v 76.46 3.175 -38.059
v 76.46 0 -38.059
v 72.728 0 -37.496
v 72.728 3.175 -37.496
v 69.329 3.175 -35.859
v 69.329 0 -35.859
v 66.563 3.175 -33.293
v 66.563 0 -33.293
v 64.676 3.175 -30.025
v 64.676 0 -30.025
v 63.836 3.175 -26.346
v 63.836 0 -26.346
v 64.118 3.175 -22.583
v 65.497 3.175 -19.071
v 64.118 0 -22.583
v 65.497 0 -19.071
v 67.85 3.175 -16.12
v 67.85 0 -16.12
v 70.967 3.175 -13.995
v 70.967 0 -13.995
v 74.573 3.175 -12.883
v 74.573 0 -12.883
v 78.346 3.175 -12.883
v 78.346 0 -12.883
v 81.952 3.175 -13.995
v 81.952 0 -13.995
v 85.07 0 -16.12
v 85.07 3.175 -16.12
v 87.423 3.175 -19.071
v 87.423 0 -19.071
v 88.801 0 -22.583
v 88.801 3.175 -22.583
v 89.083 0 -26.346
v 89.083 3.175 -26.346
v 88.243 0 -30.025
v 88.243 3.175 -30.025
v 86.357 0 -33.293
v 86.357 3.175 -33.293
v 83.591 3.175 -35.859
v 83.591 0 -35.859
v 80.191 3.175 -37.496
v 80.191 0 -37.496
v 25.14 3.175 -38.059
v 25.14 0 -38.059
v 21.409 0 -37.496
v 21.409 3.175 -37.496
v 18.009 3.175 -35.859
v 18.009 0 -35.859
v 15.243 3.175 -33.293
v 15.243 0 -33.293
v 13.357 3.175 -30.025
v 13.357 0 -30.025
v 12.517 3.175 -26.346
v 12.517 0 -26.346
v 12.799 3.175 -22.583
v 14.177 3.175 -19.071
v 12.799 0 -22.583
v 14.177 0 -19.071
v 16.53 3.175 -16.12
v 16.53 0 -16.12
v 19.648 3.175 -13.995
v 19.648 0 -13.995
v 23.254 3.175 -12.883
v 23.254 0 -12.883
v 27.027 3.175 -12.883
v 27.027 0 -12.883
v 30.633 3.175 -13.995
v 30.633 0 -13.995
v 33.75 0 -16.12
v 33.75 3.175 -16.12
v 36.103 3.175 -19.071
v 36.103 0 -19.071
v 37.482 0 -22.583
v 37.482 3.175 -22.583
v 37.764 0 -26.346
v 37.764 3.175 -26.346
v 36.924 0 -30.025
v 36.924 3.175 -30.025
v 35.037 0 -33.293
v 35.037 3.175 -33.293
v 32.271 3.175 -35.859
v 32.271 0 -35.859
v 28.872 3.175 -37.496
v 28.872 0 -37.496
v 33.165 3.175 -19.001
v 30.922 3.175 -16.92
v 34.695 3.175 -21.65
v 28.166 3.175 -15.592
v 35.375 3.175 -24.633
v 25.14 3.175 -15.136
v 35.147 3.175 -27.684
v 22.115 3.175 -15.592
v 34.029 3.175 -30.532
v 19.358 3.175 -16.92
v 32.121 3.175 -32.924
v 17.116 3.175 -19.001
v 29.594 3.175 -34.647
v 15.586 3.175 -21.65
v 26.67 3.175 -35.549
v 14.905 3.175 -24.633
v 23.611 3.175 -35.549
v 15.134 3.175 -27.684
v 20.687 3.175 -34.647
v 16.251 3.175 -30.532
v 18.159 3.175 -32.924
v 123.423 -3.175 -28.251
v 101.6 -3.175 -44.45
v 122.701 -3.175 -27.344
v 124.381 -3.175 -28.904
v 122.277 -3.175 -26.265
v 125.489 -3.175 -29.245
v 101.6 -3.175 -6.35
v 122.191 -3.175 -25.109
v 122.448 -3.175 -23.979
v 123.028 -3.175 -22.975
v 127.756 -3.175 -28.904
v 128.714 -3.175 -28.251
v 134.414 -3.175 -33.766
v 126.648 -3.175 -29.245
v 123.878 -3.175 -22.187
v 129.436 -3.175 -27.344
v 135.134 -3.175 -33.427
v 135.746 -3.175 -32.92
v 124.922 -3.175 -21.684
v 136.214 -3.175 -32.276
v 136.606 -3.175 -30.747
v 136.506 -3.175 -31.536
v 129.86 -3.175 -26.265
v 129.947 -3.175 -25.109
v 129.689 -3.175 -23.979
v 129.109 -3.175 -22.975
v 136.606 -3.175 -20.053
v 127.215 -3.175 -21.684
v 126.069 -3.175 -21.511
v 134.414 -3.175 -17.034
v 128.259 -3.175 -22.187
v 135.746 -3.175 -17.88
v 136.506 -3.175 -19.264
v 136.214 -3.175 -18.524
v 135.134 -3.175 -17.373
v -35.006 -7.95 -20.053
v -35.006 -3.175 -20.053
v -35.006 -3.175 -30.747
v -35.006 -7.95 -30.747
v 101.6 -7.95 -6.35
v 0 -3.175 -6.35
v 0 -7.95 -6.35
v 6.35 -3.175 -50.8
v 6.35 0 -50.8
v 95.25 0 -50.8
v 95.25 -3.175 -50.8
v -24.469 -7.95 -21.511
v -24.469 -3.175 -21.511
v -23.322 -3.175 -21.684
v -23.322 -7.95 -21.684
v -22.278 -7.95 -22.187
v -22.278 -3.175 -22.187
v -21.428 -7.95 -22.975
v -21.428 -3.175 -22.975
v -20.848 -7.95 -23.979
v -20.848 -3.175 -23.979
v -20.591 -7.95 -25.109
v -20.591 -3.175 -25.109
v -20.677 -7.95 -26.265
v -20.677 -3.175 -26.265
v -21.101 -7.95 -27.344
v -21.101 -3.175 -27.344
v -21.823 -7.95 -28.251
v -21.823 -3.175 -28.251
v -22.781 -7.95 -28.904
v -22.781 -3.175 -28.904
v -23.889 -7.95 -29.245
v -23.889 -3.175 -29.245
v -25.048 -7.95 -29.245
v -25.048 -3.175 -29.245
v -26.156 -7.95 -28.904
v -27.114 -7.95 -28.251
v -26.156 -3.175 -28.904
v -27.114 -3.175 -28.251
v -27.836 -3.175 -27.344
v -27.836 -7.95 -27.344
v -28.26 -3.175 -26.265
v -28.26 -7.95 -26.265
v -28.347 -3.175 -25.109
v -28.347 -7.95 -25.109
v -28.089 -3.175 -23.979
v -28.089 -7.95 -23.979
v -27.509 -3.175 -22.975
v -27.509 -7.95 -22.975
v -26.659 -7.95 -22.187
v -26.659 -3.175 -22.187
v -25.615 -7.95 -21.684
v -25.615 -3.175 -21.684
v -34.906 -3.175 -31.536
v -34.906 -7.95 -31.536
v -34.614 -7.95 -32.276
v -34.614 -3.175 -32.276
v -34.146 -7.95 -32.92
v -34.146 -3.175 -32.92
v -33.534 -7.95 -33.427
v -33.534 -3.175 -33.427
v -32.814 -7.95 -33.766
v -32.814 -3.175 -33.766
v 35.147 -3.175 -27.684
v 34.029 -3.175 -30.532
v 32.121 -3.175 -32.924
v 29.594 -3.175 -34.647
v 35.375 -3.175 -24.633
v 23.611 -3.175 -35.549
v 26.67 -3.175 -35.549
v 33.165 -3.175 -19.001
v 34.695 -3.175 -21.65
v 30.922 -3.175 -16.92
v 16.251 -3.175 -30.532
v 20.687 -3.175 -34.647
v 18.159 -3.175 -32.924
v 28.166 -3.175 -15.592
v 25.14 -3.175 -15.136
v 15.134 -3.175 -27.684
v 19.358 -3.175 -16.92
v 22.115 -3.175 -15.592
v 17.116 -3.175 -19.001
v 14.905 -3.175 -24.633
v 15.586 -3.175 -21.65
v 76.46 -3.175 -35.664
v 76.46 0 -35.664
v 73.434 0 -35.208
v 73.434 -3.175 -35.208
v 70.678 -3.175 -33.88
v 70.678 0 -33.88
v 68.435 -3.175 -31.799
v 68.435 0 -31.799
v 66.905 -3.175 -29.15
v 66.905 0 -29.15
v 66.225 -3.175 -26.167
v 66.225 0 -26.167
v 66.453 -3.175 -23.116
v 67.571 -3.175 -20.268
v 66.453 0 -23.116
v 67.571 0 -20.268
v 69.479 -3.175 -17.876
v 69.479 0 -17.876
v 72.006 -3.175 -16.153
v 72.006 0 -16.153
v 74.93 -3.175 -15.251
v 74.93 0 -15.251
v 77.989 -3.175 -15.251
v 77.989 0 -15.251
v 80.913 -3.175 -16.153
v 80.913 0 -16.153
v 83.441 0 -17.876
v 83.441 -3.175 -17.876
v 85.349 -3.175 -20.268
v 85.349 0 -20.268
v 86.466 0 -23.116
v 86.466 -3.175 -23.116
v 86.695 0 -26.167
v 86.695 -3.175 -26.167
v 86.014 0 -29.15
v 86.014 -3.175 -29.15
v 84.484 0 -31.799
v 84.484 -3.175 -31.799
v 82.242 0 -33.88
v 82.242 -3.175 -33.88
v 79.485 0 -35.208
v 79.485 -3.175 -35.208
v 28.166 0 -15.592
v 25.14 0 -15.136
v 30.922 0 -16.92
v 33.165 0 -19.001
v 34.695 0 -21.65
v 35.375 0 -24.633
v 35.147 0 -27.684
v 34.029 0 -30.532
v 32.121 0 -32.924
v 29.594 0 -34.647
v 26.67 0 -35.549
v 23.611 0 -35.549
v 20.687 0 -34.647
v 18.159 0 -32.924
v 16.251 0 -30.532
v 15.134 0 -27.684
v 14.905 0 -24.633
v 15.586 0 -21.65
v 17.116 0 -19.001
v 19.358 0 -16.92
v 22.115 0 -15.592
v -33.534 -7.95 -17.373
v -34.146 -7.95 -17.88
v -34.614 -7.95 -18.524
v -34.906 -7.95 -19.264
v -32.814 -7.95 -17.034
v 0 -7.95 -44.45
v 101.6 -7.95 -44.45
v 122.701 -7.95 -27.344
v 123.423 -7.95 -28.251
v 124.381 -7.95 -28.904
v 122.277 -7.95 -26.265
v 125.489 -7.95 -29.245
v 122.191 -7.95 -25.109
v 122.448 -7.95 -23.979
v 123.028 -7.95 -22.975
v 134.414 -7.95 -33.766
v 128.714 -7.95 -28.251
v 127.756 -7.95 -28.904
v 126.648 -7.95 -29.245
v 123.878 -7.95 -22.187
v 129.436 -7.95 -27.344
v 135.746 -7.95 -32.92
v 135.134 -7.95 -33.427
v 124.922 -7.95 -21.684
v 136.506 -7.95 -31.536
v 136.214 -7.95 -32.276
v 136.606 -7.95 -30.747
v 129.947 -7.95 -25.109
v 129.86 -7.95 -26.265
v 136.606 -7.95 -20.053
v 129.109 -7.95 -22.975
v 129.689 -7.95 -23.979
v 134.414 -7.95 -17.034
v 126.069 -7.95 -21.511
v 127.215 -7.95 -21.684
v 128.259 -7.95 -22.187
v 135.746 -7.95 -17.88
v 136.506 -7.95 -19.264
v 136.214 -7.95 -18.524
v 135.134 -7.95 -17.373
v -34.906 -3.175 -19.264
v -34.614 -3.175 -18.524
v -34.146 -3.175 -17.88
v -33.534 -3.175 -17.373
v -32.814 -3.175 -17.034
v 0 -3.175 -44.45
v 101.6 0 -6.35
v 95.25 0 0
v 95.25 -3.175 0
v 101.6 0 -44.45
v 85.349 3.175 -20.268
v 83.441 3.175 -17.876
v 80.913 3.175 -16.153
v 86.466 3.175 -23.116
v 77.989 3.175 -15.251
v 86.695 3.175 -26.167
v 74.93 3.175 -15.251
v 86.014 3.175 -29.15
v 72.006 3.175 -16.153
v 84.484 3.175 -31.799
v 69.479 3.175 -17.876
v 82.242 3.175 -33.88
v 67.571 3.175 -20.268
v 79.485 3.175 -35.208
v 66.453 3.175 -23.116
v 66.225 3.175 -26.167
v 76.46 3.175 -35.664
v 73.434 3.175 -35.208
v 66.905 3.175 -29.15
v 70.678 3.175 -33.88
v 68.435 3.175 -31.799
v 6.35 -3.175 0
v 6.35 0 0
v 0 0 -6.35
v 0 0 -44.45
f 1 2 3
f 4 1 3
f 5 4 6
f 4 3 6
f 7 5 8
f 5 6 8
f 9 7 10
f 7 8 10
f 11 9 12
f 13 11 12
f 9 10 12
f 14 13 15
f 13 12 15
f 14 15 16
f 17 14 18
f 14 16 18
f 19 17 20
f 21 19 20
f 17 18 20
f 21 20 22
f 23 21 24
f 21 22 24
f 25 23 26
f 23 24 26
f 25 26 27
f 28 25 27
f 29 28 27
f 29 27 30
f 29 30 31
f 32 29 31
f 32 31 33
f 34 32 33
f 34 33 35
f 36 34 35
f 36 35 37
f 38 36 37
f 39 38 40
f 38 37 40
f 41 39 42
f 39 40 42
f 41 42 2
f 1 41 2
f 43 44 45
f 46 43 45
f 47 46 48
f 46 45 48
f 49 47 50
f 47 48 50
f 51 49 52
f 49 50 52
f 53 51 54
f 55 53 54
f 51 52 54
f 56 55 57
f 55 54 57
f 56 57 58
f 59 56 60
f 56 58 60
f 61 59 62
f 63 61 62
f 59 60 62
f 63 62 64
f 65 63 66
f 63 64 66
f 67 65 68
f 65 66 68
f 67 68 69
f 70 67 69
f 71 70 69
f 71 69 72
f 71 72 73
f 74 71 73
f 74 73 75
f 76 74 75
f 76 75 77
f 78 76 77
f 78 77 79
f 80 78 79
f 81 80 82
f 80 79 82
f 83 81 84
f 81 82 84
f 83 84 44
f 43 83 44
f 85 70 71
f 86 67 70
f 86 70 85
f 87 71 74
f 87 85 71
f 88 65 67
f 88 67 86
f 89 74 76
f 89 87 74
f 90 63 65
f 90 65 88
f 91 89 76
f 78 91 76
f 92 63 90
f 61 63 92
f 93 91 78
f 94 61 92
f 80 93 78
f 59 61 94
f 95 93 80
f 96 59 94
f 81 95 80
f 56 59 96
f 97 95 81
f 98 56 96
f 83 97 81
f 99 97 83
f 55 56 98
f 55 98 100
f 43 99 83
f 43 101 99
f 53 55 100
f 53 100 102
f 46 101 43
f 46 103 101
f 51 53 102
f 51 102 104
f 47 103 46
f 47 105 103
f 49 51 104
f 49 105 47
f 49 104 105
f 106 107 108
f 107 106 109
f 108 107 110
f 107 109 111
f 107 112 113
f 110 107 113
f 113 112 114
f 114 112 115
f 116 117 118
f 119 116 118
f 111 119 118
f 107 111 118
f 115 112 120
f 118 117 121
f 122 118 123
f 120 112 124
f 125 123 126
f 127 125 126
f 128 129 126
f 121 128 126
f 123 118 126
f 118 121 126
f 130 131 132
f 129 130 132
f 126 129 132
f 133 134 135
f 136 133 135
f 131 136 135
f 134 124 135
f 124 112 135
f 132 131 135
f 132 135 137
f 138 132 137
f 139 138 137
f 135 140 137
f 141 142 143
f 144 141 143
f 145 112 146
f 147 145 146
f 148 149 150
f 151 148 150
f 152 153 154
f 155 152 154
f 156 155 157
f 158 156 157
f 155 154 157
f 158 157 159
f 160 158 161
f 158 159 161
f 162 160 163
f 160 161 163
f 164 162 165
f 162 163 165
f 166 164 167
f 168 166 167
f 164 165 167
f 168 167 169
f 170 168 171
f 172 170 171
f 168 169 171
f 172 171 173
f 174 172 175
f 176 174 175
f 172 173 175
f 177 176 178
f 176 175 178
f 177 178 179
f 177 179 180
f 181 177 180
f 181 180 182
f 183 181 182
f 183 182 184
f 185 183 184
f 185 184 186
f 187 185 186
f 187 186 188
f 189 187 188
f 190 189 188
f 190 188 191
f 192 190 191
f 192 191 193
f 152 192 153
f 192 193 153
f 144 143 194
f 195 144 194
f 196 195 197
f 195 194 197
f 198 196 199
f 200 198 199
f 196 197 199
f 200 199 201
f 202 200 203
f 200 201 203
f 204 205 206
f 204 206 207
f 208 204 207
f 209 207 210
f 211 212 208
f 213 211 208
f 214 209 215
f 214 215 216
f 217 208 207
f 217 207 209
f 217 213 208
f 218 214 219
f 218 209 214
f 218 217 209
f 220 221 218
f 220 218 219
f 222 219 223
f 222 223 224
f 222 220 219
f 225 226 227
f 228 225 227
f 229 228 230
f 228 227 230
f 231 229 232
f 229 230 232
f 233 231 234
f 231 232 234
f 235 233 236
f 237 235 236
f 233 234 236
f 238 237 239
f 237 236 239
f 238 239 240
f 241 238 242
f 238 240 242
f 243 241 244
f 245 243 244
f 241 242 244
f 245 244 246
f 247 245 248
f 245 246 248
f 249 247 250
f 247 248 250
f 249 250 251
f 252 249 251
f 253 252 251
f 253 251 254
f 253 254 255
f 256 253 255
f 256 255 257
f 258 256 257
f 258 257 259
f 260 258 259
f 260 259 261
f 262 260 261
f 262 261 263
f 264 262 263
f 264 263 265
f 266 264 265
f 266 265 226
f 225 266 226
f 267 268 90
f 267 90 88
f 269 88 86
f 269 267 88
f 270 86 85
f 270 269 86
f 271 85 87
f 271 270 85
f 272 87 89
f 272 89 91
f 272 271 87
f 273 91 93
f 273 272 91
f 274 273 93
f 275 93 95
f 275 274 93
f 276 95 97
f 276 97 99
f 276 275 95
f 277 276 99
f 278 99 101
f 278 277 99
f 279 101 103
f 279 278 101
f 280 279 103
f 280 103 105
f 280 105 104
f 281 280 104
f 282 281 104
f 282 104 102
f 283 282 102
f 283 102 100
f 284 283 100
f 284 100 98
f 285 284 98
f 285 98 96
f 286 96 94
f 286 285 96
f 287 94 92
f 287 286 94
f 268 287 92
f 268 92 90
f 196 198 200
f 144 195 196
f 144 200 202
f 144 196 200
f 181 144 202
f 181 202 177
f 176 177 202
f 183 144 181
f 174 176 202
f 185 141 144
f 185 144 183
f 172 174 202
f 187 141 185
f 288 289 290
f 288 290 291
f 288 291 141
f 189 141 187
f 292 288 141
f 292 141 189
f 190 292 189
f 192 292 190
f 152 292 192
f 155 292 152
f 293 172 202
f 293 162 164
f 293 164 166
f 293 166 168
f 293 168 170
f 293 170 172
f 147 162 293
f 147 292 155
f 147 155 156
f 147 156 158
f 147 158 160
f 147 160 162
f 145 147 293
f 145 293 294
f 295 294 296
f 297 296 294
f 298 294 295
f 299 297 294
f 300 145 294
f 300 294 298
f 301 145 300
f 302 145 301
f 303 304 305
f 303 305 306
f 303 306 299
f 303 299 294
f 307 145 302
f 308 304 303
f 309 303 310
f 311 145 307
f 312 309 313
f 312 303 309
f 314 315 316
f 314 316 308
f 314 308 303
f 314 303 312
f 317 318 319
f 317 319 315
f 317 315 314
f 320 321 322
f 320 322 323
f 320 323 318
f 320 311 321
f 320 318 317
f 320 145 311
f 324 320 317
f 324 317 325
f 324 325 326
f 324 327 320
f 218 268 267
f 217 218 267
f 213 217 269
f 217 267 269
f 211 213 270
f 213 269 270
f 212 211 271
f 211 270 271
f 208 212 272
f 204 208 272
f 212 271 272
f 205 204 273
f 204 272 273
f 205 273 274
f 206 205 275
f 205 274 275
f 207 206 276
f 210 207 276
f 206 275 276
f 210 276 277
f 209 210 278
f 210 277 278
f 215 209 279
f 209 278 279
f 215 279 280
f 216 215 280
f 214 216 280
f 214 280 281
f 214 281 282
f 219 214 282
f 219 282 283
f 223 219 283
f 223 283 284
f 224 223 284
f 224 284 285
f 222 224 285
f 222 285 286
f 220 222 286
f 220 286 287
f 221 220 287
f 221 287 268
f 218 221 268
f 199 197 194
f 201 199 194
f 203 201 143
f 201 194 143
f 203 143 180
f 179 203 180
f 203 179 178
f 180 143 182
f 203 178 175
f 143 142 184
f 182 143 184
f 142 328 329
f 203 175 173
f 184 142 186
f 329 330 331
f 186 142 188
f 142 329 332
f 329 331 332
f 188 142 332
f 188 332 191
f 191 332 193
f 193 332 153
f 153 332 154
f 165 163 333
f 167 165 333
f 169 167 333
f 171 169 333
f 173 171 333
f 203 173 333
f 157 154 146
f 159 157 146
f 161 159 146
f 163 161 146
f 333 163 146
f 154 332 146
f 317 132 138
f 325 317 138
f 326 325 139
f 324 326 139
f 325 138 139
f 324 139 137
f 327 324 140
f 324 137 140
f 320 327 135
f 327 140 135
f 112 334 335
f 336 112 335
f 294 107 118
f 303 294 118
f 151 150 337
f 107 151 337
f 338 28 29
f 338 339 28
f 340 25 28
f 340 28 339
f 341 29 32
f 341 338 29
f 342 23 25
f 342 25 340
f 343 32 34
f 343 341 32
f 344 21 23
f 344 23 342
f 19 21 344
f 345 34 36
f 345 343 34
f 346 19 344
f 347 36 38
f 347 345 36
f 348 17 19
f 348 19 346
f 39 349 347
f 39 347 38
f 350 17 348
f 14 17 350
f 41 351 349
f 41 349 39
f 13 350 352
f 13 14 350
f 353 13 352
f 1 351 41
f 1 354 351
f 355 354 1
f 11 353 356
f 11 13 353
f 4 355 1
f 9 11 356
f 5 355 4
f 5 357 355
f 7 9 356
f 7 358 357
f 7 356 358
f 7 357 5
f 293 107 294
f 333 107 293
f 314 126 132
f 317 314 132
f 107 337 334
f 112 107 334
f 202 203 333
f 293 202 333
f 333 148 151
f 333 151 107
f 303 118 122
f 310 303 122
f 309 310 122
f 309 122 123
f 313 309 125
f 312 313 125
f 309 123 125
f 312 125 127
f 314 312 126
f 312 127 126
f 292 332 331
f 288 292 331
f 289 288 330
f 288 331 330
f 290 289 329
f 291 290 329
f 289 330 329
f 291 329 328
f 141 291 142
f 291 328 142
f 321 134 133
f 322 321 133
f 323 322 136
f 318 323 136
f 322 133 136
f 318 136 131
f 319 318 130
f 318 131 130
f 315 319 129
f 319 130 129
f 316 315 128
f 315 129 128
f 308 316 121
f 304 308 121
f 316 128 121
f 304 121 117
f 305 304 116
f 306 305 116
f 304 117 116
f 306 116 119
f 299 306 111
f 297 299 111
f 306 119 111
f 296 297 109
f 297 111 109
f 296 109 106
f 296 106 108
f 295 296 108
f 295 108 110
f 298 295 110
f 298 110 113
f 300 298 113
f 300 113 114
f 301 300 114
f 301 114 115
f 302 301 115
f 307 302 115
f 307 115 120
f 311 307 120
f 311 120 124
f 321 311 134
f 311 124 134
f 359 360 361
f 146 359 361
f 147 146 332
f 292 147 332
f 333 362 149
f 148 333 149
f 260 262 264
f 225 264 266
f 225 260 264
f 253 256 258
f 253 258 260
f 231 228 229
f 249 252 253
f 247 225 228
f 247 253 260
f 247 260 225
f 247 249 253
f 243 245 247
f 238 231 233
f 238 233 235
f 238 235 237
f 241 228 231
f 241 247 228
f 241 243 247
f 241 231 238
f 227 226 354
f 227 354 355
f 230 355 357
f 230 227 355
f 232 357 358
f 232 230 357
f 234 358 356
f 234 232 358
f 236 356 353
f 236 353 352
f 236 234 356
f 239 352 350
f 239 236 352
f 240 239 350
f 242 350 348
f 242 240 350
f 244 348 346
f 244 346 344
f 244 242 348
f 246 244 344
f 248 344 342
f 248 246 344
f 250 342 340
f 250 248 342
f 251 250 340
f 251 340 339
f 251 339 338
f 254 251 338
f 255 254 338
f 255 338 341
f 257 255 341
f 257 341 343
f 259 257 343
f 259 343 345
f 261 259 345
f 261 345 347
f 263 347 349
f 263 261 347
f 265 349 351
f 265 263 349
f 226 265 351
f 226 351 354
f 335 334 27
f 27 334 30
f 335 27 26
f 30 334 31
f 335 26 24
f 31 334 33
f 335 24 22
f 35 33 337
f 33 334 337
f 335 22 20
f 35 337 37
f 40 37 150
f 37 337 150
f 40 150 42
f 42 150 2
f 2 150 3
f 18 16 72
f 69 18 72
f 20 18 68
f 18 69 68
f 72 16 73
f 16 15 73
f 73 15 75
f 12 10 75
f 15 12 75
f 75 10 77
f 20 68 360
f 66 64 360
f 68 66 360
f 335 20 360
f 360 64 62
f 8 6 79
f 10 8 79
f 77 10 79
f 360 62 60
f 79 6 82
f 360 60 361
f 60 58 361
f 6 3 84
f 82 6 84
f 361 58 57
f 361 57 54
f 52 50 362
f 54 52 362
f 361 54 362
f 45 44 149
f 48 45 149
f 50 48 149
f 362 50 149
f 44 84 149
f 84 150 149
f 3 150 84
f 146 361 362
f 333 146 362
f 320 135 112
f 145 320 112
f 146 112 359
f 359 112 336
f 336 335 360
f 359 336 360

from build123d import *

# Parameters (mm, degrees)
EXTRUDE1_DEPTH = 3.175
SKETCH5_R      = 12.6587948
SKETCH5_R_2    = 10.263887676
EXTRUDE2_DEPTH = 3.175
SKETCH7_R      = 10.263887676
EXTRUDE3_DEPTH = 114.636616568
SKETCH8_R      = 3.888872997
SKETCH8_W      = 50.8
SKETCH8_H      = 38.1
EXTRUDE4_DEPTH = 4.7752


with BuildPart() as part:
    # Sketch4 → Extrude1 (new body)
    with BuildSketch(Plane(origin=(0, 0, 0), x_dir=(1, 0, 0), z_dir=(0, 1, 0))):
        Polygon((0, 44.45), (6.35, 50.8), (95.25, 50.8), (101.6, 44.45), (101.6, 6.35), (95.25, 0), (6.35, 0), (0, 6.35), align=None)
    extrude(amount=-EXTRUDE1_DEPTH)

    # Sketch5 → Extrude2 (add)
    # profile 1 of 2: a face of its own
    with BuildSketch(Plane(origin=(0, 0, 0), x_dir=(1, 0, 0), z_dir=(0, 1, 0))):
        with Locations(Location((25.140280811, 25.4, 0), (0, 0, 90))):
            Circle(SKETCH5_R)
        with Locations(Location((25.140280811, 25.4, 0), (0, 0, 270))):
            Circle(SKETCH5_R_2, mode=Mode.SUBTRACT)
    # profile 2 of 2: a face of its own
    with BuildSketch(Plane(origin=(0, 0, 0), x_dir=(1, 0, 0), z_dir=(0, 1, 0))):
        with Locations(Location((76.459719189, 25.4, 0), (0, 0, 90))):
            Circle(SKETCH5_R)
        with Locations(Location((76.459719189, 25.4, 0), (0, 0, 90))):
            Circle(SKETCH5_R_2, mode=Mode.SUBTRACT)
    extrude(amount=EXTRUDE2_DEPTH)

    # Sketch7 → Extrude3 (cut, through all)
    with BuildSketch(Plane(origin=(0, 0, 0), x_dir=(1, 0, 0), z_dir=(0, 1, 0))):
        with Locations(Location((25.140280811, 25.4, 0), (0, 0, 270))):
            Circle(SKETCH7_R)
        with Locations(Location((76.459719189, 25.4, 0), (0, 0, 90))):
            Circle(SKETCH7_R)
    extrude(amount=-EXTRUDE3_DEPTH, mode=Mode.SUBTRACT)

    # Sketch8 → Extrude4 (add)
    # profile 1 of 4: a face of its own
    with BuildSketch(Plane(origin=(0, -3.175, 0), x_dir=(-1, 0, 0), z_dir=(0, 1, 0))):
        with BuildLine():
            ThreePointArc((-134.414065233, -33.76600747), (-136.000297004, -32.612437385), (-136.606100968, -30.746999975))
            Line((-136.606100968, -30.746999975), (-136.606100968, -20.053000025))
            ThreePointArc((-136.606100968, -20.053000025), (-136.000297004, -18.187562615), (-134.414065233, -17.03399253))
            Line((-134.414065233, -17.03399253), (-101.6, -6.35))
            Line((-101.6, -6.35), (-101.6, -44.45))
            Line((-101.6, -44.45), (-134.414065233, -33.76600747))
        make_face()
        with Locations(Location((-126.068509621, -25.4, 0), (0, 0, 90))):
            Circle(SKETCH8_R, mode=Mode.SUBTRACT)
    # profile 2 of 4: a face of its own
    with BuildSketch(Plane(origin=(0, -3.175, 0), x_dir=(-1, 0, 0), z_dir=(0, 1, 0))):
        with Locations((-76.2, -25.4)):
            Rectangle(SKETCH8_W, SKETCH8_H)
    # profile 3 of 4: a face of its own
    with BuildSketch(Plane(origin=(0, -3.175, 0), x_dir=(-1, 0, 0), z_dir=(0, 1, 0))):
        with Locations((-25.4, -25.4)):
            Rectangle(SKETCH8_W, SKETCH8_H)
    # profile 4 of 4: a face of its own
    with BuildSketch(Plane(origin=(0, -3.175, 0), x_dir=(-1, 0, 0), z_dir=(0, 1, 0))):
        with BuildLine():
            ThreePointArc((32.814065233, -17.03399253), (34.400297004, -18.187562615), (35.006100968, -20.053000025))
            Line((35.006100968, -20.053000025), (35.006100968, -30.746999975))
            ThreePointArc((35.006100968, -30.746999975), (34.400297004, -32.612437385), (32.814065233, -33.76600747))
            Line((32.814065233, -33.76600747), (0, -44.45))
            Line((0, -44.45), (0, -6.35))
            Line((0, -6.35), (32.814065233, -17.03399253))
        make_face()
        with Locations(Location((24.468509621, -25.4, 0), (0, 0, 90))):
            Circle(SKETCH8_R, mode=Mode.SUBTRACT)
    extrude(amount=-EXTRUDE4_DEPTH)


solid = part.part
